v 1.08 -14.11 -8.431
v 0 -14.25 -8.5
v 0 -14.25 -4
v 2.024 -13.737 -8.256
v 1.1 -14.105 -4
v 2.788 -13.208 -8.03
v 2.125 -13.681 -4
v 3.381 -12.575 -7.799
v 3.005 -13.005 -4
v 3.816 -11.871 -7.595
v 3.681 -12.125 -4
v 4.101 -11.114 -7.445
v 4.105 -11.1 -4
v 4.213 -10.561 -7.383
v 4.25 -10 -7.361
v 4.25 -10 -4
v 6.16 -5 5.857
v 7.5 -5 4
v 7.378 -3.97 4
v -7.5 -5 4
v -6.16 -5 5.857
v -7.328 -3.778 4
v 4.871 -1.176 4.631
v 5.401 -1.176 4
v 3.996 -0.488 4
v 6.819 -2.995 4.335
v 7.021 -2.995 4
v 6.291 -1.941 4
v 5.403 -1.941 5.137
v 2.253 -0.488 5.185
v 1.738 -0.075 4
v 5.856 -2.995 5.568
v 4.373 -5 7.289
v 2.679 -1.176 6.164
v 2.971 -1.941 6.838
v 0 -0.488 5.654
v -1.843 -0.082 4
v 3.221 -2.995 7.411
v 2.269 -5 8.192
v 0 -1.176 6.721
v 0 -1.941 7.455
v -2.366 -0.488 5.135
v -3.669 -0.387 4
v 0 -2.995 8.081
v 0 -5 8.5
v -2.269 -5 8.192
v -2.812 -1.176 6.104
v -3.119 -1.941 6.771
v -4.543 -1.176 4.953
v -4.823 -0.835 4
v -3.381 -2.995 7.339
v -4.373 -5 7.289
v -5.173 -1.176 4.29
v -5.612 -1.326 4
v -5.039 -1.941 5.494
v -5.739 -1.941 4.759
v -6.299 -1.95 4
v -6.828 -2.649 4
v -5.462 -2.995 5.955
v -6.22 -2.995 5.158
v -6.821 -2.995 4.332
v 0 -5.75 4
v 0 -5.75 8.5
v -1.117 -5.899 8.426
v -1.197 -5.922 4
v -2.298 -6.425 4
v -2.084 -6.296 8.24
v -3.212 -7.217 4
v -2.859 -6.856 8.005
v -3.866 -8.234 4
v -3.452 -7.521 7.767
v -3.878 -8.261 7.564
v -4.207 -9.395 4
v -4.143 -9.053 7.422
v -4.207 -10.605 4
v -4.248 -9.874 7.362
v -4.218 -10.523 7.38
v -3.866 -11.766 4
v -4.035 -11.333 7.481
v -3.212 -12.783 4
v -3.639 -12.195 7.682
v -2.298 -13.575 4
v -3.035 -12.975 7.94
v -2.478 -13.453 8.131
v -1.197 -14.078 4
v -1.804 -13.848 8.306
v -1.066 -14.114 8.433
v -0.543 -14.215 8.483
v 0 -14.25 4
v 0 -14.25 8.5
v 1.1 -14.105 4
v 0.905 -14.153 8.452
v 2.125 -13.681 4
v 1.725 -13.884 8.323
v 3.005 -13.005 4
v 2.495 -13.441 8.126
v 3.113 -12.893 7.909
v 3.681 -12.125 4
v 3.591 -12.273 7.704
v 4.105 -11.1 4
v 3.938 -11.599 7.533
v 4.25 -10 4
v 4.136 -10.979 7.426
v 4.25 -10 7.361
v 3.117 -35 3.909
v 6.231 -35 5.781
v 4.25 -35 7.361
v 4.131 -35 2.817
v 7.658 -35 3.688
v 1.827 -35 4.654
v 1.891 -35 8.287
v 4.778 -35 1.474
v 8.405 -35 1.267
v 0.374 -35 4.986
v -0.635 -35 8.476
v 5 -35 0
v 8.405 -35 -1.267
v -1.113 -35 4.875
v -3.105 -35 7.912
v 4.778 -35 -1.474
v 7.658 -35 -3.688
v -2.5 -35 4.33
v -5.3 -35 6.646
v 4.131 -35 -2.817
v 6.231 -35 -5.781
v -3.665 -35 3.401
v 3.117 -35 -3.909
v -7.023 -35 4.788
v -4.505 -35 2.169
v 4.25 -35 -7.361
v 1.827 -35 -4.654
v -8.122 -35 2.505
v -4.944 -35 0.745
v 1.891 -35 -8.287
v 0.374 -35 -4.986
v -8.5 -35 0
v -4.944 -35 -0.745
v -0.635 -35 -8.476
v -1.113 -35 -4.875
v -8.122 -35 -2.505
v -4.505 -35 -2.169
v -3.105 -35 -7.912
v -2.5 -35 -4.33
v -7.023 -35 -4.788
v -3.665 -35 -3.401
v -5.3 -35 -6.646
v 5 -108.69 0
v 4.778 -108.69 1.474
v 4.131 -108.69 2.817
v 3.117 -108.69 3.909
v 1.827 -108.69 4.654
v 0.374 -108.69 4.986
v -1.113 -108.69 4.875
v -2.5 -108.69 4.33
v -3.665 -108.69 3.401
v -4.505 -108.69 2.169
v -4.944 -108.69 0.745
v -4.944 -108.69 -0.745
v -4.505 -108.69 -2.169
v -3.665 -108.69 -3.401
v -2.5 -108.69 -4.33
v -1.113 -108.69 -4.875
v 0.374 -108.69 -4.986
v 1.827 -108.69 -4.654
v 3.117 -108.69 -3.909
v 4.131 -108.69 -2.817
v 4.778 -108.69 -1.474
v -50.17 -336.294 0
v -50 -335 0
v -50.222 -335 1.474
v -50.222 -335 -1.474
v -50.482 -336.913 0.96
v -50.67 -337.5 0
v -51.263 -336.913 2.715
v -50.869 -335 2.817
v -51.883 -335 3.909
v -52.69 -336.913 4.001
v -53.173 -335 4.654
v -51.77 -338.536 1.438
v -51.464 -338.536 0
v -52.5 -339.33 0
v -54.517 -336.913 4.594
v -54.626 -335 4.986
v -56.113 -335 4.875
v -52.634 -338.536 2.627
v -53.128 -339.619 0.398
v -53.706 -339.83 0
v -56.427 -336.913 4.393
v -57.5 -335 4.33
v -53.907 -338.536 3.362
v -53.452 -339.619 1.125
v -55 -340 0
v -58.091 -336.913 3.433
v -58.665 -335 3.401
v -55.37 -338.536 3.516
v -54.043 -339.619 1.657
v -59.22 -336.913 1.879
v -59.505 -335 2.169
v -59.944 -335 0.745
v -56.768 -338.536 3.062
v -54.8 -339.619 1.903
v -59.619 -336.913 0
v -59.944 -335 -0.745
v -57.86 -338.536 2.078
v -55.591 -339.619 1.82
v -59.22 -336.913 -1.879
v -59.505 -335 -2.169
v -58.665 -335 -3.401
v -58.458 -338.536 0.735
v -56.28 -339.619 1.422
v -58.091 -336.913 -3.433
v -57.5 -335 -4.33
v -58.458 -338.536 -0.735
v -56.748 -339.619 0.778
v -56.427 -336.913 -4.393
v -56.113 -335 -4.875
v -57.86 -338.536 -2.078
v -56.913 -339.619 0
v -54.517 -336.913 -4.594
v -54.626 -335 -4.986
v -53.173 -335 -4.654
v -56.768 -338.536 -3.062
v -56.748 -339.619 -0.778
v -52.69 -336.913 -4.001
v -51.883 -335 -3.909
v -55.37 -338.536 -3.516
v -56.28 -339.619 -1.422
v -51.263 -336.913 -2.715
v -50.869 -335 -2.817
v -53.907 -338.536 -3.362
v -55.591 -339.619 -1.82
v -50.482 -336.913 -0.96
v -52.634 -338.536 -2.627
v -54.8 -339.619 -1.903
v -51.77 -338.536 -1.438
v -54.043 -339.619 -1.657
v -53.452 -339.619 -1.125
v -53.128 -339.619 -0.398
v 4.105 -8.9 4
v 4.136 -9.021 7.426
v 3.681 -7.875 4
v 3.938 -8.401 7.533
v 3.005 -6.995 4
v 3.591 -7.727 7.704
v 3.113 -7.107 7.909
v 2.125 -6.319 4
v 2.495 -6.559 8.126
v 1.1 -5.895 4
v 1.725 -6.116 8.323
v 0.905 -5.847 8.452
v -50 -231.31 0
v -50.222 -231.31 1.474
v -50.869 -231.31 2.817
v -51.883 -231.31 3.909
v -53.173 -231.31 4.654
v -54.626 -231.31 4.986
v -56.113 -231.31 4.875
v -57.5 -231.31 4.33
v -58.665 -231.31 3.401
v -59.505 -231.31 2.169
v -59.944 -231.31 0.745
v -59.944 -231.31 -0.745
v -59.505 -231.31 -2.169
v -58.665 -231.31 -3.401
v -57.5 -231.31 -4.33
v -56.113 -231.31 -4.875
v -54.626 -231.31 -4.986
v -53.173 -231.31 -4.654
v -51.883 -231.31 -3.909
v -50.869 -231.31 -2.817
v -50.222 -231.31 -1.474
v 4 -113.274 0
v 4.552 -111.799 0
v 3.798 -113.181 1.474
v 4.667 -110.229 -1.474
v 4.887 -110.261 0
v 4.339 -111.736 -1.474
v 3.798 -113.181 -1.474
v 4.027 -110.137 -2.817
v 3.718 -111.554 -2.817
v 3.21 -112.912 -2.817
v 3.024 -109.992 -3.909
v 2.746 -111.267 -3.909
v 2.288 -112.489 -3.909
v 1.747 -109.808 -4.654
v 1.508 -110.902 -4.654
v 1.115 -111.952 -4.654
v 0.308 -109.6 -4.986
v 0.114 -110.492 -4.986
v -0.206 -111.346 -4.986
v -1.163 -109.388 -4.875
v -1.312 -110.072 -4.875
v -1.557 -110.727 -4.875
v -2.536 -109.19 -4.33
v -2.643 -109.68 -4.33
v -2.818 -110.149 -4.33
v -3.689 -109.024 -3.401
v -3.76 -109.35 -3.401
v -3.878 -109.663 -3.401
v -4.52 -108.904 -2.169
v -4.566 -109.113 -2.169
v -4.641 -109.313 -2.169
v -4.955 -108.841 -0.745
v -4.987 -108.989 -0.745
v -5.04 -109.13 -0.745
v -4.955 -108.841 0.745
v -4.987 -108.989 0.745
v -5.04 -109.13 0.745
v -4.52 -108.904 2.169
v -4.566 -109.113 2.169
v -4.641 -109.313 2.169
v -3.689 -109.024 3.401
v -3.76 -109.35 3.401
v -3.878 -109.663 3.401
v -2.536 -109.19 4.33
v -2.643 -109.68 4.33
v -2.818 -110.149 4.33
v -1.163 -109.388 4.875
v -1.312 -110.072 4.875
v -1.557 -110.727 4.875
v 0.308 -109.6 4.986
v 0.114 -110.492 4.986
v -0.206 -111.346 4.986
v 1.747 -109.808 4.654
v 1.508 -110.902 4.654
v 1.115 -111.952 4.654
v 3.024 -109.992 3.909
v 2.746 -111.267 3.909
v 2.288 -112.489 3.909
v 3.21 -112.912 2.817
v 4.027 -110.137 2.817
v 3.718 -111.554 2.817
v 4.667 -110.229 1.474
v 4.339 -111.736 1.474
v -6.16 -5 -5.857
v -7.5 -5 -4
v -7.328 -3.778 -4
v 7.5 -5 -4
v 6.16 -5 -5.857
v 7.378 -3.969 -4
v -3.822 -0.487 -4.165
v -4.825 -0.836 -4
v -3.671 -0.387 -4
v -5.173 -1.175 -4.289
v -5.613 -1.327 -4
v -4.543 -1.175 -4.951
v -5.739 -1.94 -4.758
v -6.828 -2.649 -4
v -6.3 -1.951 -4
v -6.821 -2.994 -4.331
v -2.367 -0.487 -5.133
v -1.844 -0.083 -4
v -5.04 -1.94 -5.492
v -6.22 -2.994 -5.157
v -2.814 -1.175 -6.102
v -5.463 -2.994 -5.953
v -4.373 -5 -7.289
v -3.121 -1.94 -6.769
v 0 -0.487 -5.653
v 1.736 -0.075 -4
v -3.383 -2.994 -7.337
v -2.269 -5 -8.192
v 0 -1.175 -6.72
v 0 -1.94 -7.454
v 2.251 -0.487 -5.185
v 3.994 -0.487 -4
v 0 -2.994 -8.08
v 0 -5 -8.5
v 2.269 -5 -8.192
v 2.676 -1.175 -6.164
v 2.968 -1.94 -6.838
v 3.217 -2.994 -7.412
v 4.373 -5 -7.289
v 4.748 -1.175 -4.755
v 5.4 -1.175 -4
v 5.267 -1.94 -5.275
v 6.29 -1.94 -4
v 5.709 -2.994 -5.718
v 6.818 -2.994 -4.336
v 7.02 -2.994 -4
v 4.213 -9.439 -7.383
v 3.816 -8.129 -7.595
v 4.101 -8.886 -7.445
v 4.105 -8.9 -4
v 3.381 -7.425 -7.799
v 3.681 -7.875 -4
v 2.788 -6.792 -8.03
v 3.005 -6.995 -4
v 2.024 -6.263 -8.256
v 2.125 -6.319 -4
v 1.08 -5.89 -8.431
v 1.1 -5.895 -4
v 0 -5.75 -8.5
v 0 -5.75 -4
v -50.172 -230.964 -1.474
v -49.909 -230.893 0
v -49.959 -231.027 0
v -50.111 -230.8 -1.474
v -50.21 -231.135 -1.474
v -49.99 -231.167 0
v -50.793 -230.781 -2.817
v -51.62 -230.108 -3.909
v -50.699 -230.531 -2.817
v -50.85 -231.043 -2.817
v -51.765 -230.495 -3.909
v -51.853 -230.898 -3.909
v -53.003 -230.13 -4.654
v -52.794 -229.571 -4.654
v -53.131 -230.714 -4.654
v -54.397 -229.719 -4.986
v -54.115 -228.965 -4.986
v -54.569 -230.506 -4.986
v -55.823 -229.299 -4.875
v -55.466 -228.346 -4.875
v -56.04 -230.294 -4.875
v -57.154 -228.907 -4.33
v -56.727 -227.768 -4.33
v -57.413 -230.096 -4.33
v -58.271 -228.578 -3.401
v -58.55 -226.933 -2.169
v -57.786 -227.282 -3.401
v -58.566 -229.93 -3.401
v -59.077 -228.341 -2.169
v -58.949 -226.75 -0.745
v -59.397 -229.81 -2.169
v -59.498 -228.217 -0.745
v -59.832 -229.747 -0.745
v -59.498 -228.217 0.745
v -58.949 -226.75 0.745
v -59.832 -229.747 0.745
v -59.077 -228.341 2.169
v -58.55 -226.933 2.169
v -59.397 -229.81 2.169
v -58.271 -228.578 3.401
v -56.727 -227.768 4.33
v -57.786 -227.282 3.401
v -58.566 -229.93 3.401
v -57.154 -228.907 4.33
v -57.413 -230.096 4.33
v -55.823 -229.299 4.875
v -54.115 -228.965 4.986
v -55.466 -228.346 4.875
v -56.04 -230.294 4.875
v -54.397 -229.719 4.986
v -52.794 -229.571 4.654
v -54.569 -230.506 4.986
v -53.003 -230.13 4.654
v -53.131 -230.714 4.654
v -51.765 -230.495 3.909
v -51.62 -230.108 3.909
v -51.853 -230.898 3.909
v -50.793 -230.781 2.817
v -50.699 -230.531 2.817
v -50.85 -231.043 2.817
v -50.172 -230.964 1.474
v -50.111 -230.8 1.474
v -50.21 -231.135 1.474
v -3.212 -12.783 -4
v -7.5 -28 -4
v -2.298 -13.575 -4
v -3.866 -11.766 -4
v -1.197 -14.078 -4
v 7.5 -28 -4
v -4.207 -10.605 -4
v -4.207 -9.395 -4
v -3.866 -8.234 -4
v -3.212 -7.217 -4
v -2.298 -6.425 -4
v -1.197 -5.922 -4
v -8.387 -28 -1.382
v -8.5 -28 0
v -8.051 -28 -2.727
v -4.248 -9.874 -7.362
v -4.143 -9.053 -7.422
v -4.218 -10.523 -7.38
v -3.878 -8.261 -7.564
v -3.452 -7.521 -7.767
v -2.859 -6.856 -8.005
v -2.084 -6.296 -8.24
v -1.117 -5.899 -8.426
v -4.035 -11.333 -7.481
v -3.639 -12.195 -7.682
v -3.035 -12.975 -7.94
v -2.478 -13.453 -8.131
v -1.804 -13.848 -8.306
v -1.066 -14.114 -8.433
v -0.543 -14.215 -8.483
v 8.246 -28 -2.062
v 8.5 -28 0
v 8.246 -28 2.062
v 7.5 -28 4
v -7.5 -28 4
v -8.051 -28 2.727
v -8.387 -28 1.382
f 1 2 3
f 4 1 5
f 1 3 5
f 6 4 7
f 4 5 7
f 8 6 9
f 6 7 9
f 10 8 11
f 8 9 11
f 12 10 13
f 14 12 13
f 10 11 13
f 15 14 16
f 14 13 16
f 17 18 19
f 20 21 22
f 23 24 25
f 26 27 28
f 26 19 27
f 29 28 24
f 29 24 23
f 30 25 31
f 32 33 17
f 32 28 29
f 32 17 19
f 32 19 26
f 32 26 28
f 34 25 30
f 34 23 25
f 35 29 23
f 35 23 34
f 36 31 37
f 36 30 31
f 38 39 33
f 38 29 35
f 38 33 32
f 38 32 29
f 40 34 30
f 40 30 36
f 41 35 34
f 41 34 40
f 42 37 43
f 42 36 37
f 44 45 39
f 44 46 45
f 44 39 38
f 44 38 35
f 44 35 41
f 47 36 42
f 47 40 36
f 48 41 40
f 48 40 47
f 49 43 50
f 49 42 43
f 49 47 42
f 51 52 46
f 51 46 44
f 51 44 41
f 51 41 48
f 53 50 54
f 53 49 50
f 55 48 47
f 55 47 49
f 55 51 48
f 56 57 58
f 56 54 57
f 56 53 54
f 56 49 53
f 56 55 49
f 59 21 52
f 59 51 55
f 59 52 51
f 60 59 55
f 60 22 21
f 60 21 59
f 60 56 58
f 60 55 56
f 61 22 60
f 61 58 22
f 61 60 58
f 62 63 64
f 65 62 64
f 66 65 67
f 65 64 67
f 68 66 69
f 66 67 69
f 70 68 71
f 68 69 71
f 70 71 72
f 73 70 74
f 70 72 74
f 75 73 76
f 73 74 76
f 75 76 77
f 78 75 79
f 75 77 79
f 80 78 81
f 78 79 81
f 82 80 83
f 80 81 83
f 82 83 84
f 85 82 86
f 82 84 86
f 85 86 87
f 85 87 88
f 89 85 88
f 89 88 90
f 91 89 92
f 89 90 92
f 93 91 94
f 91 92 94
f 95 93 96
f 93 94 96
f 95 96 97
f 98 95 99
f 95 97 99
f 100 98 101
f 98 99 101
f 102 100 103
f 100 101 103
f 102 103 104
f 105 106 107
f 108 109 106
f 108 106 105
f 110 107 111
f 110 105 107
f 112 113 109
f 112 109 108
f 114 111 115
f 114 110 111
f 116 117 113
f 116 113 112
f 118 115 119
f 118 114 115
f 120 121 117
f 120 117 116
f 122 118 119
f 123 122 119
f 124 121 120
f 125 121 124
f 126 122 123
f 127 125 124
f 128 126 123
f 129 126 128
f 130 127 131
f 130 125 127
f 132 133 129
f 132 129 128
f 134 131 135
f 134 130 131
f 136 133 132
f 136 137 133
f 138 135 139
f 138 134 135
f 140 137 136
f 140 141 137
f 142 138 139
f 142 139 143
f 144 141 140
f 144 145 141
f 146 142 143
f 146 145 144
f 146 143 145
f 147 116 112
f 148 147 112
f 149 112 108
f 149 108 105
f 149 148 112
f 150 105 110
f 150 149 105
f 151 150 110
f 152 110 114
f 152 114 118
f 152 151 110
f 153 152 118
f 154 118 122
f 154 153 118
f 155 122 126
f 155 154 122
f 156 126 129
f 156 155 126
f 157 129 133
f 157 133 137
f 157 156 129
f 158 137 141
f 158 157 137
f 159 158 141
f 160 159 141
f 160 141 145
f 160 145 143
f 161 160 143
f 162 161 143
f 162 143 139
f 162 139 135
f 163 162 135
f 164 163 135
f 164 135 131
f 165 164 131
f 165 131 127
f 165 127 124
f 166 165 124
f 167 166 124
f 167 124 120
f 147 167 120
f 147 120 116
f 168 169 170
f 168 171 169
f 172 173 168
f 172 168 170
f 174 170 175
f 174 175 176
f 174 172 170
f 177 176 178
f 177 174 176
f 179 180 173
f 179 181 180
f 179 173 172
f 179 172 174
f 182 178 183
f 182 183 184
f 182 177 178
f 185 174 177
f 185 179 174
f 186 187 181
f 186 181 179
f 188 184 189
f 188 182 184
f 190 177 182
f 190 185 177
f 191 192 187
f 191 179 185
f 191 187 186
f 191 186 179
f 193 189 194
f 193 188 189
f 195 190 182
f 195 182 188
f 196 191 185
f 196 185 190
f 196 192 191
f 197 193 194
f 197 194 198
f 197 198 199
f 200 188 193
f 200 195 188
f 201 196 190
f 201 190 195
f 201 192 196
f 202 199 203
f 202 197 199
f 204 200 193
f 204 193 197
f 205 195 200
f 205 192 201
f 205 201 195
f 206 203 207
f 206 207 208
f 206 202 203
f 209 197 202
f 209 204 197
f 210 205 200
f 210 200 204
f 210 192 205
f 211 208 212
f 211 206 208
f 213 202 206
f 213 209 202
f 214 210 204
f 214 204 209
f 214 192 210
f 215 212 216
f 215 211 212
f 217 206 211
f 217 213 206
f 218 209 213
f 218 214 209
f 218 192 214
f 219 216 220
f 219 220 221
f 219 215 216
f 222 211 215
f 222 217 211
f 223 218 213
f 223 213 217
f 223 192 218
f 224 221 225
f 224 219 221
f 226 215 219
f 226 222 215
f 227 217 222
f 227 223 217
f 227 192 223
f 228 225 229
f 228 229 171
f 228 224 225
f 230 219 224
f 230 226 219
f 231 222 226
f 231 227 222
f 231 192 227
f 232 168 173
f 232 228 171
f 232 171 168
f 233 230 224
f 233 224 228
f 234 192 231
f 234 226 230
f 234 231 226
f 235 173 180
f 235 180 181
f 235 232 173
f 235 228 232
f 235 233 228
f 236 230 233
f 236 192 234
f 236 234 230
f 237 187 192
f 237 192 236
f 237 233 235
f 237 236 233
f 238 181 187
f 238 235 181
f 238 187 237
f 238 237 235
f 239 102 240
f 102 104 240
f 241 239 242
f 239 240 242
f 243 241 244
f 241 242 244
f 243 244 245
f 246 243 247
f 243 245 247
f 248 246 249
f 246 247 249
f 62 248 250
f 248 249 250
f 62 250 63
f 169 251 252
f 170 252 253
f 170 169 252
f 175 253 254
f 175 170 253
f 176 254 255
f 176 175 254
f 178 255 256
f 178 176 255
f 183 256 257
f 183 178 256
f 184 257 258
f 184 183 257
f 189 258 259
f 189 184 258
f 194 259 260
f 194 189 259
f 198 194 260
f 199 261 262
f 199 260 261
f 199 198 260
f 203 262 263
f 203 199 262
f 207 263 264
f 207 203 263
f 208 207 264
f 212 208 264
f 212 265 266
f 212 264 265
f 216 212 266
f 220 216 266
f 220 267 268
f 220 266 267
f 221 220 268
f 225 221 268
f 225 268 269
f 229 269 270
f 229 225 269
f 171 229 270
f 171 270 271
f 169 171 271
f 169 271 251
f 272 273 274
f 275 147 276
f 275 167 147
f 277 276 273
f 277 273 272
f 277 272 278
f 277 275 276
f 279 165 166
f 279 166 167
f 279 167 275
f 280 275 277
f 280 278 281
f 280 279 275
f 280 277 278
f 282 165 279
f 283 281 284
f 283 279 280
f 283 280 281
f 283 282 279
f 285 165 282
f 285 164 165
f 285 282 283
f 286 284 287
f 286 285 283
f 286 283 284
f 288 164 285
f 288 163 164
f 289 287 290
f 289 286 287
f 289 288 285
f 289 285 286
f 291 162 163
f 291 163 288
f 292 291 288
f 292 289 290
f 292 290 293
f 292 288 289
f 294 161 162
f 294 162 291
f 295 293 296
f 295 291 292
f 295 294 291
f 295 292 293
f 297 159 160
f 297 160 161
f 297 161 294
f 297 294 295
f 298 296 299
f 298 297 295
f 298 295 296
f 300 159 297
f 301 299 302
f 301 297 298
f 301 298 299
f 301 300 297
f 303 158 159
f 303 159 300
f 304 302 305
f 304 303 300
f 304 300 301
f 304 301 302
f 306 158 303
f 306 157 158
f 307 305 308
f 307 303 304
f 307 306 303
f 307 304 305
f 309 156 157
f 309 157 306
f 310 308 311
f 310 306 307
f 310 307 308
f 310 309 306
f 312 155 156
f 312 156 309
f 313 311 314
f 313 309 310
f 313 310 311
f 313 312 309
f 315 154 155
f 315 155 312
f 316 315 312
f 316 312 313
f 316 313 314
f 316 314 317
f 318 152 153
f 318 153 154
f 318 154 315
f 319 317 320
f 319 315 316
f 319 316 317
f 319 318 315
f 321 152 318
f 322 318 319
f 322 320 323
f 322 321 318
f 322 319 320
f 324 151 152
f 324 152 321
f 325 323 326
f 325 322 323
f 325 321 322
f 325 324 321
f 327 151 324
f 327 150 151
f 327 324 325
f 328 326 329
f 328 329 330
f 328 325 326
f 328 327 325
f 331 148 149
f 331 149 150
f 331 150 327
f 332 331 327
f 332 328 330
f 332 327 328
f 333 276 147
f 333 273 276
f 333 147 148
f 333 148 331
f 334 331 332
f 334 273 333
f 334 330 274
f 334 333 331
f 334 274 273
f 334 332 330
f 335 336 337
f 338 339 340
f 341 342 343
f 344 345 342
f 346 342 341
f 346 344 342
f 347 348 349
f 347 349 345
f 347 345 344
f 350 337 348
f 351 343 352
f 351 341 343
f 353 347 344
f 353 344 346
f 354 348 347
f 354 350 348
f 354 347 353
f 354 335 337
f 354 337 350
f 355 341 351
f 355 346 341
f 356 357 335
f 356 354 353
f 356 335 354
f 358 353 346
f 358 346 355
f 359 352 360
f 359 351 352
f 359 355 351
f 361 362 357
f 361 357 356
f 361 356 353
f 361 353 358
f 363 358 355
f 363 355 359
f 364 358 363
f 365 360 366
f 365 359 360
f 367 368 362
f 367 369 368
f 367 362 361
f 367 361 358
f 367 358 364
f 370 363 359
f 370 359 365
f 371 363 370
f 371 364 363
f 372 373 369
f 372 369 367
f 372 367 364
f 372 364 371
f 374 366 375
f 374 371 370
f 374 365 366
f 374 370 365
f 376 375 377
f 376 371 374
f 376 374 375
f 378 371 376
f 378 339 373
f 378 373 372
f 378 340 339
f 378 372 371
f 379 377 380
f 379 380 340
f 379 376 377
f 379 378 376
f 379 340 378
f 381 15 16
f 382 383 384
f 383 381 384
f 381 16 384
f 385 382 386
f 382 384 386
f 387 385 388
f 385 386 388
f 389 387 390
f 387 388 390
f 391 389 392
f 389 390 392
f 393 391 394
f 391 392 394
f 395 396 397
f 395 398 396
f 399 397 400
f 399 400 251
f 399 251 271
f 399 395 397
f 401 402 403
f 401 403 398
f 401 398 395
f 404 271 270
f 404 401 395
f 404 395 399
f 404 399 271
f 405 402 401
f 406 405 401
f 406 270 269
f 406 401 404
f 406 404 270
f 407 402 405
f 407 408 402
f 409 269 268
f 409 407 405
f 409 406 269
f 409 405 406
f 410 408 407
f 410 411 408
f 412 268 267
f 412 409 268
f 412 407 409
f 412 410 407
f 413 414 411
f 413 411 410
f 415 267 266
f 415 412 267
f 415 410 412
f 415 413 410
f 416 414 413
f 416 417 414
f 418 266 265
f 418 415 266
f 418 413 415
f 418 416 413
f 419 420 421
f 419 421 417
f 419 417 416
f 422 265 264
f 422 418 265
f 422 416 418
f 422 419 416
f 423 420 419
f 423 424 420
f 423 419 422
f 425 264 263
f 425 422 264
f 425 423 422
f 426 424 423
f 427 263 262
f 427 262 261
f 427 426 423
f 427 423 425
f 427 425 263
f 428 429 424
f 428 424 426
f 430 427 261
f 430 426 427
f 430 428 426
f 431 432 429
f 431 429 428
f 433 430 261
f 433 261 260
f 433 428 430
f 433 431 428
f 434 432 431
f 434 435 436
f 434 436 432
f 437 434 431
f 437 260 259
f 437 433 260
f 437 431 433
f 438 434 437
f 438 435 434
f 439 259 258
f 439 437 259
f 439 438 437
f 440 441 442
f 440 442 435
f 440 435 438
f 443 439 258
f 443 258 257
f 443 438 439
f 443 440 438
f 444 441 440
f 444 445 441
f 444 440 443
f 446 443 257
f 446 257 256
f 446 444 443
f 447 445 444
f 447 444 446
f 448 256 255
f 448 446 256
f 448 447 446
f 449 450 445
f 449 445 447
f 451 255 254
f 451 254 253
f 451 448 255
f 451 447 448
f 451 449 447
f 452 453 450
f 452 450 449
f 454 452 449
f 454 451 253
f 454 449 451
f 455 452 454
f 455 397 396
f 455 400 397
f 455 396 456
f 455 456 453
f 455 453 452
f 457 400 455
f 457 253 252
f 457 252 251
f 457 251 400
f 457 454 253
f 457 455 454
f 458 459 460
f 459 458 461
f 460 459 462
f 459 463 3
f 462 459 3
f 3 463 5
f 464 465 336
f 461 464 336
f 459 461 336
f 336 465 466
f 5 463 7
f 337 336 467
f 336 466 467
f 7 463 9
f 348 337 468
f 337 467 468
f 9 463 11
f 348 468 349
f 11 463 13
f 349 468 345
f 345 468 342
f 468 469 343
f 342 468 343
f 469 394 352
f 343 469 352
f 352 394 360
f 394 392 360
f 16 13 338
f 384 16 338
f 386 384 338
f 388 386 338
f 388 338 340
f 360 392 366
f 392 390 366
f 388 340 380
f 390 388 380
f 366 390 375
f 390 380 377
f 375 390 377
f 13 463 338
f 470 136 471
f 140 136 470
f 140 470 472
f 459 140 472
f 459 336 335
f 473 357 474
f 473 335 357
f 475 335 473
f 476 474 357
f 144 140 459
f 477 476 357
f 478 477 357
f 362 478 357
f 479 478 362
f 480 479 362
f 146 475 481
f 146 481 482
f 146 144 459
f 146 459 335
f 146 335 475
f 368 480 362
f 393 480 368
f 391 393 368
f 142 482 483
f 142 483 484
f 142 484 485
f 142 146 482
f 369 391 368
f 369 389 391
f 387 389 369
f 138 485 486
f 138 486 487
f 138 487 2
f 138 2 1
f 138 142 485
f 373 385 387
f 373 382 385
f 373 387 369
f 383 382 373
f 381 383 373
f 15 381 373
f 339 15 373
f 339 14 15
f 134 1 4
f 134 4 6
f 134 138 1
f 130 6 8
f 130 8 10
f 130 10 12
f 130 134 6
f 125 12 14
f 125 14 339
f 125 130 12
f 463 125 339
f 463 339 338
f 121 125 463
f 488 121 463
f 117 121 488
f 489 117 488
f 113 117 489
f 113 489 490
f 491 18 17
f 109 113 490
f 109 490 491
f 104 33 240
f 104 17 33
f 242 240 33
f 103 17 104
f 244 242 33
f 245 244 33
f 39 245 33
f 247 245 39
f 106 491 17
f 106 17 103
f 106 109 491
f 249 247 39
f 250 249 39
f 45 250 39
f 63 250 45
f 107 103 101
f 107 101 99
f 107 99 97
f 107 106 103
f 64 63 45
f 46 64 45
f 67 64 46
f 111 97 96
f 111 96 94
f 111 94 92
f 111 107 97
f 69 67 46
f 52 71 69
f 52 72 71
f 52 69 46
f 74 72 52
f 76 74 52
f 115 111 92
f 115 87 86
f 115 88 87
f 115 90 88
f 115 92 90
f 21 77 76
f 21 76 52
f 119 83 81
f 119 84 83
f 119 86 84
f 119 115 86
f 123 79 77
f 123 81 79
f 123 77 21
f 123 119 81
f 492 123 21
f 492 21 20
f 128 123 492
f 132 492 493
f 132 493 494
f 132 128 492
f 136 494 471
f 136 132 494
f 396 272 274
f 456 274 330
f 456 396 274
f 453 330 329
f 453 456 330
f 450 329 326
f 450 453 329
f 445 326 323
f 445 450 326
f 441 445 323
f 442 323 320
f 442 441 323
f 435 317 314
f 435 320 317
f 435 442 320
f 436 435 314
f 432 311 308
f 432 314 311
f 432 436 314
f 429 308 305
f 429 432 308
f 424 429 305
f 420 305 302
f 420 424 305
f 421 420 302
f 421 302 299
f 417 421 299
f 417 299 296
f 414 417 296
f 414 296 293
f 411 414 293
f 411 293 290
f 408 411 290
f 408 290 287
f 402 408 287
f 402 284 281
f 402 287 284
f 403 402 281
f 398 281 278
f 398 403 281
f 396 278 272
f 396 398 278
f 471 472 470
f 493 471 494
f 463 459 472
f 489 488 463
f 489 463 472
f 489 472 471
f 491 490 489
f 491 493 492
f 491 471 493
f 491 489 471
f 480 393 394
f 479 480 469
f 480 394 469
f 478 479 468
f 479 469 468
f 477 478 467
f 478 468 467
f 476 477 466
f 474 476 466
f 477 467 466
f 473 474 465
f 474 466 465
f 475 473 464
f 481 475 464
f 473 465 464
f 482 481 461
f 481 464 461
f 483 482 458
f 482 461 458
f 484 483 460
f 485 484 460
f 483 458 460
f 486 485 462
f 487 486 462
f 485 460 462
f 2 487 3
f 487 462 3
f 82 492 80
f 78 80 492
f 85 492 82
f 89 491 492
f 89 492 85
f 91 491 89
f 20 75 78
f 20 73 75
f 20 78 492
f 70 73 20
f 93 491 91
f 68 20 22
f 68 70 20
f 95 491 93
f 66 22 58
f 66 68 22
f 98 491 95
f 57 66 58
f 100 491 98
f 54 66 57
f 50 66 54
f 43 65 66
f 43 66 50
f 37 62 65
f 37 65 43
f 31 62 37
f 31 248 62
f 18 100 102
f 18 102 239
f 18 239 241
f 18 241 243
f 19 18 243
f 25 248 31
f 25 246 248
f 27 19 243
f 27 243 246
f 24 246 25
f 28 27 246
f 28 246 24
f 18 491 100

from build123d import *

# Parameters (mm, degrees)
F2_DEPTH      = 25
F2_DEPTH_BACK = 25
F3_W          = 56
F3_H          = 8
F4_DEPTH      = 25
F4_DEPTH_BACK = 25
F5_R          = 5
F7_R          = 5


with BuildPart() as f1:
    # F0 (on Top) → F1 (revolve)
    with BuildSketch(Plane.XY):
        with BuildLine():
            Line((0, 0), (-3.5, 0))
            ThreePointArc((-3.5, 0), (-7.0355339059, -1.4644660941), (-8.5, -5))
            Line((-8.5, -5), (-8.5, -35))
            Line((-8.5, -35), (0, -35))
            Line((0, -35), (0, -14.25))
            ThreePointArc((0, -14.25), (-4.25, -10), (0, -5.75))
            Line((0, -5.75), (0, 0))
        make_face()
        with BuildLine():
            Line((0, -14.25), (0, -5.75))
            ThreePointArc((0, -5.75), (-4.25, -10), (0, -14.25))
        make_face()
    revolve(axis=Axis((0, -17.5, 0), (0, -1, 0)))

    # F0 (on Top) → F2 (cut, two sides)
    with BuildSketch(Plane.XY) as f2_sk:
        with BuildLine():
            Line((0, -14.25), (0, -5.75))
            ThreePointArc((0, -5.75), (-4.25, -10), (0, -14.25))
        make_face()
        with BuildLine():
            ThreePointArc((4.25, -10), (3.00520382, -6.99479618), (0, -5.75))
            Line((0, -5.75), (0, -14.25))
            ThreePointArc((0, -14.25), (3.00520382, -13.00520382), (4.25, -10))
        make_face()
    extrude(amount=-F2_DEPTH, mode=Mode.SUBTRACT)
    extrude(f2_sk.sketch, amount=F2_DEPTH_BACK, mode=Mode.SUBTRACT)

    # F3 (on Right) → F4 (cut, two sides)
    with BuildSketch(Plane.YZ) as f4_sk:
        Rectangle(F3_W, F3_H)
    extrude(amount=-F4_DEPTH, mode=Mode.SUBTRACT)
    extrude(f4_sk.sketch, amount=F4_DEPTH_BACK, mode=Mode.SUBTRACT)

    # F6: sweep along a path in F0
    with BuildLine(Plane.XY) as f6_path:
        Line((0, -35), (0, -108.6904958737))
        ThreePointArc((0, -108.6904958737), (-0.1379895247, -109.9698836913), (-0.5456110626, -111.1904241367))
        Line((-0.5456110626, -111.1904241367), (-54.4543889374, -228.8095758633))
        ThreePointArc((-54.4543889374, -228.8095758633), (-54.8620104753, -230.0301163087), (-55, -231.3095041263))
        Line((-55, -231.3095041263), (-55, -340))
    # F5 (on face) → F6 (sweep)
    with BuildSketch(Plane.XZ.offset(35)):
        Circle(F5_R)
    sweep(path=f6_path.line)

    # F7
    f7_edges = [f1.edges().sort_by_distance(p)[0] for p in [
        (-60, -340, 0),
    ]]
    fillet(f7_edges, radius=F7_R)


solid = f1.part
